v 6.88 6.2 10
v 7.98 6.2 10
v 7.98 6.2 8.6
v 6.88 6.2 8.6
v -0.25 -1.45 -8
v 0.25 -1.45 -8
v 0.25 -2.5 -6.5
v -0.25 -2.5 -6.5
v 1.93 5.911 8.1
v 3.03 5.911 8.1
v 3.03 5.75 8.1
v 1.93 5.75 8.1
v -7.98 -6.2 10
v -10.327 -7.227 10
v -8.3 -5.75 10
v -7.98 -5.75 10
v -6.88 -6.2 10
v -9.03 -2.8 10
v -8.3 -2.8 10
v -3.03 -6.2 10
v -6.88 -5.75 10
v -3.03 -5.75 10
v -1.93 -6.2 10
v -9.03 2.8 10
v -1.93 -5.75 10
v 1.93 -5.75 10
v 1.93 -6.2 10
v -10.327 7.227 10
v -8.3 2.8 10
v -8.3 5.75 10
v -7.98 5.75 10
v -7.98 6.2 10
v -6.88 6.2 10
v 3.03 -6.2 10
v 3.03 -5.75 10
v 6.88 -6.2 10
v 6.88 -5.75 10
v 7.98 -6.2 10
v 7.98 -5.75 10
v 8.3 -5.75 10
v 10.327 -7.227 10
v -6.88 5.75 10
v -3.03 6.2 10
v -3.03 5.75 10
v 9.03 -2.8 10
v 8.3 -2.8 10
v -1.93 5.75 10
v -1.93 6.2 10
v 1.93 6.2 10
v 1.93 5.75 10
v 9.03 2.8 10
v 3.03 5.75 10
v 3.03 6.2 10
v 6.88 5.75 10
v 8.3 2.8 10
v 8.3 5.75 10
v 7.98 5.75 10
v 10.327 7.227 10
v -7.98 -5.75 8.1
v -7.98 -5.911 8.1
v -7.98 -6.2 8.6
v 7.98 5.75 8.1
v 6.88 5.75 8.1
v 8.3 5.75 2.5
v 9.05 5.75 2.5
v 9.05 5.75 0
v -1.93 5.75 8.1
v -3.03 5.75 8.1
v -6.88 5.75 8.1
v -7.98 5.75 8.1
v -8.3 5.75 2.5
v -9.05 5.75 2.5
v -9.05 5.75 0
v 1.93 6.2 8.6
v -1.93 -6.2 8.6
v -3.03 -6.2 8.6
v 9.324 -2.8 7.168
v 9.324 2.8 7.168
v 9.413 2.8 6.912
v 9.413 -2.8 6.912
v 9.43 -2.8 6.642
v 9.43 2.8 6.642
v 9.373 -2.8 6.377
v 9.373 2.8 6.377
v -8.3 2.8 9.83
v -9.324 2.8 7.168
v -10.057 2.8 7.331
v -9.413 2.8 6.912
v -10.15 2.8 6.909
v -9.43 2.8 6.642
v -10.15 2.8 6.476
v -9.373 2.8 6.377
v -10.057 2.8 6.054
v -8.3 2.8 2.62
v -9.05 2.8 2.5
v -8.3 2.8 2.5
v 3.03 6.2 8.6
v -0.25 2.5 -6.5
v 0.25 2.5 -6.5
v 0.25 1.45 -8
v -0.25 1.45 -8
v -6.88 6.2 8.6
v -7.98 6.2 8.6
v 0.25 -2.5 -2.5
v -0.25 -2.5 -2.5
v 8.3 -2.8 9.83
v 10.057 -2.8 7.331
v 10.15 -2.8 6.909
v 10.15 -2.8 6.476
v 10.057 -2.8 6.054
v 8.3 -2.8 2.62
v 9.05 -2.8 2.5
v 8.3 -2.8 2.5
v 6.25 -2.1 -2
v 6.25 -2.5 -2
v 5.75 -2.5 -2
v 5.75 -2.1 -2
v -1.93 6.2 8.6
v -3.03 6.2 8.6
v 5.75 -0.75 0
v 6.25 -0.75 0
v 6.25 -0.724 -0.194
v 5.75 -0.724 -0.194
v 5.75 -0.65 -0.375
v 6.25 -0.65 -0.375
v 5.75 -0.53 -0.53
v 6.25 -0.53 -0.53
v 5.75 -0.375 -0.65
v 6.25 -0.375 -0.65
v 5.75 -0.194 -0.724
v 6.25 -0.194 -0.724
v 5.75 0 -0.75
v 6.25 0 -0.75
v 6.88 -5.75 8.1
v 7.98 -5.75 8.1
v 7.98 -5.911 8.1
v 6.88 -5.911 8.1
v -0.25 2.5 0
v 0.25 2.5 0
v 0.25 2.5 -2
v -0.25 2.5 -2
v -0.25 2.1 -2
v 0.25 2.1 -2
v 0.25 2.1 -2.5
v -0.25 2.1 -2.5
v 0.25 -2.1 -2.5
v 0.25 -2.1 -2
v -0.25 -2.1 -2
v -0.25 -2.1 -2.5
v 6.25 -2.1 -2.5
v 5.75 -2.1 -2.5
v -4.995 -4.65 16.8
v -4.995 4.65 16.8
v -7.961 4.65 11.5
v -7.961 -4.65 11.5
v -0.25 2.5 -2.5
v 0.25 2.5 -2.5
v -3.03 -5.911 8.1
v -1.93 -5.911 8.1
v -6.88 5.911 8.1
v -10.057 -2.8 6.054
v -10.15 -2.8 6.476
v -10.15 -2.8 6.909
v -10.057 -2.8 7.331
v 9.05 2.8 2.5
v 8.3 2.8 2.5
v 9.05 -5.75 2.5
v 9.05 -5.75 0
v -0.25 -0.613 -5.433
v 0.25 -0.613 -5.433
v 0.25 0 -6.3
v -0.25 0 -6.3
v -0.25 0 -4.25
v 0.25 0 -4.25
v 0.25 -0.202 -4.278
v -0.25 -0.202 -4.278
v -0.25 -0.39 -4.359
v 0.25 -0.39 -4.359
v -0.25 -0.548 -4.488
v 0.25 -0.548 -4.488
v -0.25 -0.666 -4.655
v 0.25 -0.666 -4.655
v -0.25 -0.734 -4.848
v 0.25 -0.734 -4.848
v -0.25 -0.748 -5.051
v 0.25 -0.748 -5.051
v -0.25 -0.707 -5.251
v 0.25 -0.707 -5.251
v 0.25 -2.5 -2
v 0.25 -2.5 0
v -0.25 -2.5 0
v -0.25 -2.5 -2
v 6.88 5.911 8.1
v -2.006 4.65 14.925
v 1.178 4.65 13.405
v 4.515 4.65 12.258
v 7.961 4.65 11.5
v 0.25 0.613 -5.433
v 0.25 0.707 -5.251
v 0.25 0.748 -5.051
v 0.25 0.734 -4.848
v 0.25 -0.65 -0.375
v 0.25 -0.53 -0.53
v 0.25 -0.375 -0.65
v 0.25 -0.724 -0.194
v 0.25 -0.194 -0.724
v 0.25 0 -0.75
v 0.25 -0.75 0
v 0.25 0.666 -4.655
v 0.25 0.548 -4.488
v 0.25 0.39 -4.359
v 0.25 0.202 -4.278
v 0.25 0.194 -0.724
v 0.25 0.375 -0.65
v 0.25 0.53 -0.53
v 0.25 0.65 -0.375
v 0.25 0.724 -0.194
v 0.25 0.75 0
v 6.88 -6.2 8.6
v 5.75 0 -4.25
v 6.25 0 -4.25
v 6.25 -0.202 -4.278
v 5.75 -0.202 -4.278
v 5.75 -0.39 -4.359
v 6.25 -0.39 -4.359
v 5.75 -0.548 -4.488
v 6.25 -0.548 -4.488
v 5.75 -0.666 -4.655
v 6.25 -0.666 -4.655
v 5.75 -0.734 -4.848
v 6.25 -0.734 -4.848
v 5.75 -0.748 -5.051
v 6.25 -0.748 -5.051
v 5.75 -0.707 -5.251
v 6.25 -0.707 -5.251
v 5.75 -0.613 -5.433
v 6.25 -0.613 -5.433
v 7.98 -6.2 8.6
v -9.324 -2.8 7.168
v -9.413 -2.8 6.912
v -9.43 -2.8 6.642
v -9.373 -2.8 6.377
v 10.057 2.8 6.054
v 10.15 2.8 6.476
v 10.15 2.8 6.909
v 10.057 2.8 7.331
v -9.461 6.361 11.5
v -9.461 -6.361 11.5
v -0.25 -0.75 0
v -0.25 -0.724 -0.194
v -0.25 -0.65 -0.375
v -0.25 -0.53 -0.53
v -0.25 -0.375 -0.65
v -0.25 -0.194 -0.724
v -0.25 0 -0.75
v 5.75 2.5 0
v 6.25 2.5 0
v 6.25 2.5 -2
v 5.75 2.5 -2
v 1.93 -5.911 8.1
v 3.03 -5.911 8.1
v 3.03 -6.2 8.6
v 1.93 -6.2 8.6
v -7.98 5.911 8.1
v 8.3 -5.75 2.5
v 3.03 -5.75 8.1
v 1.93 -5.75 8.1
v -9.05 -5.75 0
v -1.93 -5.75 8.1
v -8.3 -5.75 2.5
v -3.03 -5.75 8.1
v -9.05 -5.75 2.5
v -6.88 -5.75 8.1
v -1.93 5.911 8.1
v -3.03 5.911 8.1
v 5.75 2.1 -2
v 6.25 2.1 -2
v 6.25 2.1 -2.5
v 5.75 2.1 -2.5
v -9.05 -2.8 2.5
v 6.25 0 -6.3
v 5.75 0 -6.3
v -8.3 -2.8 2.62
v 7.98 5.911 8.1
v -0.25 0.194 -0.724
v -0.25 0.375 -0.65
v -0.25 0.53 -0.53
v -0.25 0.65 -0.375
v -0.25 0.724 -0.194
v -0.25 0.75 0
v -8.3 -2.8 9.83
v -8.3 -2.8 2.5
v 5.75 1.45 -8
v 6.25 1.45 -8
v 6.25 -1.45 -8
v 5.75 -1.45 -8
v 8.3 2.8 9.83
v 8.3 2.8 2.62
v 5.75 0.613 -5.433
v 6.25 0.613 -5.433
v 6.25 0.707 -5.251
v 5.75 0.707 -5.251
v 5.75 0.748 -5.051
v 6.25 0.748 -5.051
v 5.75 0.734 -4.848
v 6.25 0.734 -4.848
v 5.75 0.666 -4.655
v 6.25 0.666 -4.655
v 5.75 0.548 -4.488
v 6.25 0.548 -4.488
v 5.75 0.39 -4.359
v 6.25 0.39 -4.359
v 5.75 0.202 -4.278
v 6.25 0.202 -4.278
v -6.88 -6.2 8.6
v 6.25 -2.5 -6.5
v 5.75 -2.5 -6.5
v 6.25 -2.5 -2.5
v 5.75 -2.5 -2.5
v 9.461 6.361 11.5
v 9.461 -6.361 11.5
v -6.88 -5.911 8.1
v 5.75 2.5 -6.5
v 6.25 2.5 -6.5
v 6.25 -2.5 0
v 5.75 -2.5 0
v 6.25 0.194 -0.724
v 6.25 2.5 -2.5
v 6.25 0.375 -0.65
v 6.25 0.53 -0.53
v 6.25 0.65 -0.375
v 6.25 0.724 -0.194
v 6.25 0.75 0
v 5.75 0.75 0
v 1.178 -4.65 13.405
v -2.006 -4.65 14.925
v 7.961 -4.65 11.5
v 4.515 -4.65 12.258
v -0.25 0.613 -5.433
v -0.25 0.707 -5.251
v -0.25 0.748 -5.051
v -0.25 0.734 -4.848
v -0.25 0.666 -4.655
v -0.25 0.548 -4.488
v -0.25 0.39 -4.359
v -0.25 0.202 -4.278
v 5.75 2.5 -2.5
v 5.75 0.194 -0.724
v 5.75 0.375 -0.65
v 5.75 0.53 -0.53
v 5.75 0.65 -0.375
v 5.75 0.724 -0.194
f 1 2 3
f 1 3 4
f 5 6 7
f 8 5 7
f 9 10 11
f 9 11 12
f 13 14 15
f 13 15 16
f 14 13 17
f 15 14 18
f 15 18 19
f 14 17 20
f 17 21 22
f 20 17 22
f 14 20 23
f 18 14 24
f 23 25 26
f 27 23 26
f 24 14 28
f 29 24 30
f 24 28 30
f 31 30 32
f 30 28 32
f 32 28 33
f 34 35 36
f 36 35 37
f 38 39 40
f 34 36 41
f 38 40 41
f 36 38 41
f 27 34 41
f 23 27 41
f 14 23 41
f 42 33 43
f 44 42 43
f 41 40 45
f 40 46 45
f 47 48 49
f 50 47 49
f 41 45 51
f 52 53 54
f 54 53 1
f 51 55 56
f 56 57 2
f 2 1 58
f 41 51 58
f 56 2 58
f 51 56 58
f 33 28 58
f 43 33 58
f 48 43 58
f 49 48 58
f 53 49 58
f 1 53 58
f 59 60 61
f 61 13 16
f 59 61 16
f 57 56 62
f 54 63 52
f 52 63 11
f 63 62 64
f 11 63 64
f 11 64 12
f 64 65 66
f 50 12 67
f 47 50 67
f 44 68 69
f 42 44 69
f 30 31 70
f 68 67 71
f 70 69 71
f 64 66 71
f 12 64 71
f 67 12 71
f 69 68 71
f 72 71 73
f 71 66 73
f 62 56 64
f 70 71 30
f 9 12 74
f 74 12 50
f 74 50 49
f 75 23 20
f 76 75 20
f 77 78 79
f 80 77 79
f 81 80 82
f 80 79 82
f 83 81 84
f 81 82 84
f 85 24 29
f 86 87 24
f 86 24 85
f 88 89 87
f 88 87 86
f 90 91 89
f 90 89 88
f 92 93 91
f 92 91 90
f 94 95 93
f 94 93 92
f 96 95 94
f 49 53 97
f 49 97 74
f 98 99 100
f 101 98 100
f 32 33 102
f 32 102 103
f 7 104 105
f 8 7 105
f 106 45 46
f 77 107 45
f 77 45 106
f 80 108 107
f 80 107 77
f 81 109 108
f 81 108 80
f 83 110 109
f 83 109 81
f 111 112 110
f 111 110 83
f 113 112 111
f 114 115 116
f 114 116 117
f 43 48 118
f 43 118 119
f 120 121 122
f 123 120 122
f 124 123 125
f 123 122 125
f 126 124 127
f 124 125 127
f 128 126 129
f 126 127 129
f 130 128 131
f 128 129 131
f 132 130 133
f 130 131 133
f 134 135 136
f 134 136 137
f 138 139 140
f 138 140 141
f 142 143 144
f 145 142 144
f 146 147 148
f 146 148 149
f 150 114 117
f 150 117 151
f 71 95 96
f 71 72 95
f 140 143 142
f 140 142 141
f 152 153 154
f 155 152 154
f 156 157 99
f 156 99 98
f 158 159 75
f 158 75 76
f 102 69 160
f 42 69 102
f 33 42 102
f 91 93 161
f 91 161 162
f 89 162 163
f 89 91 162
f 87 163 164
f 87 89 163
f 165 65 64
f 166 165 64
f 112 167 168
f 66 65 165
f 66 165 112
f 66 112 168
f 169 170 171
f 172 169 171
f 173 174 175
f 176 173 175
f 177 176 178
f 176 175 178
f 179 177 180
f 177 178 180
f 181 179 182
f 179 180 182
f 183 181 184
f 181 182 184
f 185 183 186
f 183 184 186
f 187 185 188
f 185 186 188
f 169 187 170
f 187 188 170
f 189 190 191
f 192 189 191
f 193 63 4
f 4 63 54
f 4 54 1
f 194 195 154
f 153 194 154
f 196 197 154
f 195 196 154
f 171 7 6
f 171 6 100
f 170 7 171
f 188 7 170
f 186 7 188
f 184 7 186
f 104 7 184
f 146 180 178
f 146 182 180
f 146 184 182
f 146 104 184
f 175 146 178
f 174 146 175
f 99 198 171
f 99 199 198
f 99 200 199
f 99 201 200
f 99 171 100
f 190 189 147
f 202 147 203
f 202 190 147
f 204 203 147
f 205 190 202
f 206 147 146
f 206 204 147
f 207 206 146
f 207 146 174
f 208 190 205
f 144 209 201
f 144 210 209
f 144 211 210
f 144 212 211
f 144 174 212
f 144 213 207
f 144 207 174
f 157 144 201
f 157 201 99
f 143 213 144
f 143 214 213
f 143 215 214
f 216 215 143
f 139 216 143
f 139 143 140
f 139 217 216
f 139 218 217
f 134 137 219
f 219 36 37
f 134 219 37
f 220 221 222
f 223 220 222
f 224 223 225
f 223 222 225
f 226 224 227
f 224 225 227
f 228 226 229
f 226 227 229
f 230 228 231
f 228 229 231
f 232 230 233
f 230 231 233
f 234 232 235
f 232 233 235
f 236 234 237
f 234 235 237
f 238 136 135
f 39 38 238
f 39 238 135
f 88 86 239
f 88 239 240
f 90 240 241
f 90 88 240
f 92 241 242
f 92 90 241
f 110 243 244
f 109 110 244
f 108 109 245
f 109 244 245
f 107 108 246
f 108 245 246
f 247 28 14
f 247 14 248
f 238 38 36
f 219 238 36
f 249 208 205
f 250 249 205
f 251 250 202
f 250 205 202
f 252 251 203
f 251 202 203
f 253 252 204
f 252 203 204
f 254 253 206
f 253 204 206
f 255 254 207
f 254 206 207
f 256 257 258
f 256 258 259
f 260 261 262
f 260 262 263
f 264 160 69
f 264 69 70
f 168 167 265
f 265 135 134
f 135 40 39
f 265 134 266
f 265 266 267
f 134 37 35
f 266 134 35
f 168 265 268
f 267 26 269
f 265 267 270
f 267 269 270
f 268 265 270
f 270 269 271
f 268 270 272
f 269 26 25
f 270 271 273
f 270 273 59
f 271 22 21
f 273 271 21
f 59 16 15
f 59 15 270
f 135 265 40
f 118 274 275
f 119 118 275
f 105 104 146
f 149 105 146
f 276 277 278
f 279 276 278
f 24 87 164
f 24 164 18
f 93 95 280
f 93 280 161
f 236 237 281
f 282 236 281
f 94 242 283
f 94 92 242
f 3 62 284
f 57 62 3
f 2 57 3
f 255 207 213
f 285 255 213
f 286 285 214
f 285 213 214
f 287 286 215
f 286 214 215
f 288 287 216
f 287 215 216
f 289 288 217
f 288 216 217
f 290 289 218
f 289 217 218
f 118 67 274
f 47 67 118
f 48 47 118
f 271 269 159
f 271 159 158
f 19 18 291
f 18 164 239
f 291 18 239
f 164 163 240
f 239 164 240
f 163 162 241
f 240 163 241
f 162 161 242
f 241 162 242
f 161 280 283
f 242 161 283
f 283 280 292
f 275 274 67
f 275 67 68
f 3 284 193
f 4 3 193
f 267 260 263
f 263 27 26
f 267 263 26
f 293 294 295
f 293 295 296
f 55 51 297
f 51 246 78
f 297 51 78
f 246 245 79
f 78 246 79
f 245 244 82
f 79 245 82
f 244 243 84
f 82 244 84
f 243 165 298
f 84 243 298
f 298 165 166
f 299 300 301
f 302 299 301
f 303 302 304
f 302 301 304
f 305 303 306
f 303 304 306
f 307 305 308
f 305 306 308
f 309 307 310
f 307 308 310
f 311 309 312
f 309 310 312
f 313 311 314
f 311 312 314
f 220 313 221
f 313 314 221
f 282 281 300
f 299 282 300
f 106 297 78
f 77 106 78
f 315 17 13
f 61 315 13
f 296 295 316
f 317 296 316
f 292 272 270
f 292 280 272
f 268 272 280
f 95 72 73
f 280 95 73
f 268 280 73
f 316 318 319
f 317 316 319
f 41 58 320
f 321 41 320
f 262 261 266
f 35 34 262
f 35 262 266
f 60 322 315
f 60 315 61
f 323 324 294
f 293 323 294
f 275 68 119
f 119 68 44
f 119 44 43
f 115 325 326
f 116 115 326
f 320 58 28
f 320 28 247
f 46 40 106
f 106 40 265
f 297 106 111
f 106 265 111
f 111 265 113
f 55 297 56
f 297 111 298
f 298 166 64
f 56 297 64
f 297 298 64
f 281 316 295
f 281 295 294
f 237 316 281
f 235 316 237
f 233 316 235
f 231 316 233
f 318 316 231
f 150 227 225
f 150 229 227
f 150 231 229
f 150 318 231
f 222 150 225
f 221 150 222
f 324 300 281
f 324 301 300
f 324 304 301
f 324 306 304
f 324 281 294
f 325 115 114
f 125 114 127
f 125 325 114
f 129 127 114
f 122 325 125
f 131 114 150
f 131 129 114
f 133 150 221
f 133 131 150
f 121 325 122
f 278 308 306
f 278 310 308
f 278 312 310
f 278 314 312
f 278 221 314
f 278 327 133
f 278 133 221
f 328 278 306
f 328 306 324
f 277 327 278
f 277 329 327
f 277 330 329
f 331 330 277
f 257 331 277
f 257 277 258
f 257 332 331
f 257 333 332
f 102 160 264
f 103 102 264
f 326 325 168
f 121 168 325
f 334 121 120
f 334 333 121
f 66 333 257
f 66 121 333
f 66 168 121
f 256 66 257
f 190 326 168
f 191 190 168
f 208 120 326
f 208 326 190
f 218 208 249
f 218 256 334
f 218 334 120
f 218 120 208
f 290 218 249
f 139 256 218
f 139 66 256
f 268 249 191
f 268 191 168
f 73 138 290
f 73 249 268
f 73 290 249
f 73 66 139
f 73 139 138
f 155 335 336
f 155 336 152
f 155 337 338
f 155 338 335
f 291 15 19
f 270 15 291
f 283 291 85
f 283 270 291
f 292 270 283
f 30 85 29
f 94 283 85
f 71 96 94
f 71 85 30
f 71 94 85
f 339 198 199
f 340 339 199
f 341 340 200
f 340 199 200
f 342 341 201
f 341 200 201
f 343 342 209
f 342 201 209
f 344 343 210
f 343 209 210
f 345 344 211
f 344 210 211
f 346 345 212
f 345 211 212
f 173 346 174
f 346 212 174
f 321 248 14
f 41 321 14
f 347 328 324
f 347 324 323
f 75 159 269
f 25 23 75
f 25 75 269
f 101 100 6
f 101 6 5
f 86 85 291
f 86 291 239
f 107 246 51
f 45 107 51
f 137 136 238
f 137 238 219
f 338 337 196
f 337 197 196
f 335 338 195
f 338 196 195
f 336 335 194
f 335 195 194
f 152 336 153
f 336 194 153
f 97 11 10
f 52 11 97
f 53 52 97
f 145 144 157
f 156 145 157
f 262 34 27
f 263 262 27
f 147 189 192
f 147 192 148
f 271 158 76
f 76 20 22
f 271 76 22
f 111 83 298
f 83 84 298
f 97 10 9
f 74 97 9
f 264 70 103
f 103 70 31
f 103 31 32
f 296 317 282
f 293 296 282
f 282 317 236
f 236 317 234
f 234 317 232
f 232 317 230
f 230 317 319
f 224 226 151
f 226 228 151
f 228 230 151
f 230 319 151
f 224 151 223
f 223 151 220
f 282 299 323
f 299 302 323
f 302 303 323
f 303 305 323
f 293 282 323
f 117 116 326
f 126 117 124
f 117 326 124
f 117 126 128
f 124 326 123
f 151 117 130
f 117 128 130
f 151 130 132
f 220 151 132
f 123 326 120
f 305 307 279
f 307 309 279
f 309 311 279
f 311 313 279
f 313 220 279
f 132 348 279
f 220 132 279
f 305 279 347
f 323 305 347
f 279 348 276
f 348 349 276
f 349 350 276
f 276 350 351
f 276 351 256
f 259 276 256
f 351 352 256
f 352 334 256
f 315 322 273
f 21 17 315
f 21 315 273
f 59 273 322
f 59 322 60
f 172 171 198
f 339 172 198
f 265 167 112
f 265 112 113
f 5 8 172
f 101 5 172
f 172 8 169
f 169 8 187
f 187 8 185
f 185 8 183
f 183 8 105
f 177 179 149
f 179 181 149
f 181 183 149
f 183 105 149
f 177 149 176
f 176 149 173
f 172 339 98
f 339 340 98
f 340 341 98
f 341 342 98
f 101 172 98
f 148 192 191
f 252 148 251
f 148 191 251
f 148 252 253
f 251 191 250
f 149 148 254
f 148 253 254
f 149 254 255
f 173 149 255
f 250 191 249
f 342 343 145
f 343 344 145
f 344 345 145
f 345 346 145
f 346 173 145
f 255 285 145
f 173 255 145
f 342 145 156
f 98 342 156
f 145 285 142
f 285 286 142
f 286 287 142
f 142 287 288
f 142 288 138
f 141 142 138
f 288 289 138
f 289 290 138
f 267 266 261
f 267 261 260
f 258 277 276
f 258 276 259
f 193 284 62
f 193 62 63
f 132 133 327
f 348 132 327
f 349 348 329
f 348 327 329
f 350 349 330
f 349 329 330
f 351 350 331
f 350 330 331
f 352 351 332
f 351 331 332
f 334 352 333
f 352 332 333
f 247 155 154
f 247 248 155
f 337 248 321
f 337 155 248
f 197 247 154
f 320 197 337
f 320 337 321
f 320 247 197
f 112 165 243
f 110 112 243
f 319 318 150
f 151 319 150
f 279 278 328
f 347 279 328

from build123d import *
from OCP.BRepFilletAPI import BRepFilletAPI_MakeChamfer

# Parameters (mm, degrees)
SKETCH1_W                       = 16.6
SKETCH1_H                       = 11.5
BOSS_EXTRUDE1_DEPTH             = 10
SKETCH2_W                       = 21
SKETCH2_H                       = 14.8
BOSS_EXTRUDE2_DEPTH             = 1.5
SKETCH3_W                       = 0.5
SKETCH3_H                       = 5
BOSS_EXTRUDE3_DEPTH             = 8
SKETCH4_W                       = 0.5
SKETCH4_H                       = 0.4
CUT_EXTRUDE1_DEPTH              = 22.623424798
BOSS_EXTRUDE4_REACH             = 19.241
SKETCH5_W                       = 0.75
SKETCH5_H                       = 2.5
BOSS_EXTRUDE4_DIRECTION_2_REACH = 19.241
BOSS_EXTRUDE5_DEPTH             = 2.8
CHAMFER1_SIZE                   = 1.8
CHAMFER1_SIZE_2                 = 1.039230485
BOSS_EXTRUDE6_DEPTH             = 4.65
SKETCH8_W                       = 1.1
SKETCH8_H                       = 0.45
BOSS_EXTRUDE7_DEPTH             = 1.9
CHAMFER2_SIZE                   = 0.5
CHAMFER2_SIZE2                  = 0.288675135


with BuildPart() as part:
    # Sketch1 → Boss-Extrude1 (new body)
    with BuildSketch(Plane.XY):
        Rectangle(SKETCH1_W, SKETCH1_H)
    extrude(amount=BOSS_EXTRUDE1_DEPTH)

    # Sketch2 → Boss-Extrude2 (add)
    with BuildSketch(Plane.XY.offset(10)):
        Rectangle(SKETCH2_W, SKETCH2_H)
    extrude(amount=BOSS_EXTRUDE2_DEPTH)

    # Sketch3 → Boss-Extrude3 (add)
    with BuildSketch(Plane(origin=(0, 0, 0), x_dir=(-1, 0, 0), z_dir=(0, 0, -1))):
        Rectangle(SKETCH3_W, SKETCH3_H)
        with Locations((-6, 0)):
            Rectangle(SKETCH3_W, SKETCH3_H)
    extrude(amount=BOSS_EXTRUDE3_DEPTH)

    # Sketch4 → Cut-Extrude1 (cut, through all)
    with BuildSketch(Plane(origin=(6.25, 0, 0), x_dir=(0, 0, -1), z_dir=(1, 0, 0))):
        Polygon((6.5, 2.5), (8, 1.449688693), (8, 2.5), align=None)
        Polygon((8, -2.5), (8, -1.449688693), (6.5, -2.5), align=None)
        with Locations((2.25, -2.3)):
            Rectangle(SKETCH4_W, SKETCH4_H)
        with BuildLine():
            ThreePointArc((0, -0.75), (0.530330086, -0.530330086), (0.75, 0))
            Line((0.75, 0), (0, 0))
            Line((0, 0), (0, -0.75))
        make_face()
        with BuildLine():
            Line((0, 0), (0.75, 0))
            ThreePointArc((0.75, 0), (0.530330086, 0.530330086), (0, 0.75))
            Line((0, 0.75), (0, 0))
        make_face()
        with Locations((2.25, 2.3)):
            Rectangle(SKETCH4_W, SKETCH4_H)
        with BuildLine():
            Line((4.25, 0), (6.3, 0))
            Line((6.3, 0), (5.432692308, 0.612598863))
            ThreePointArc((5.432692308, 0.612598863), (4.655050171, 0.665965176), (4.25, 0))
        make_face()
        with BuildLine():
            Line((5.432692308, -0.612598863), (6.3, 0))
            Line((6.3, 0), (4.25, 0))
            ThreePointArc((4.25, 0), (4.655050171, -0.665965176), (5.432692308, -0.612598863))
        make_face()
    extrude(amount=-CUT_EXTRUDE1_DEPTH, mode=Mode.SUBTRACT)

    # Boss-Extrude4: up to this face of the body (flat: up to its plane)
    boss_extrude4_end = Plane(part.part.faces().sort_by_distance((0, 5.75, 5))[0])
    # Sketch5 → Boss-Extrude4 (add, up to the picked face)
    with BuildSketch(Plane(origin=(0, 0, 0), x_dir=(1, 0, 0), z_dir=(0, 1, 0)), mode=Mode.PRIVATE) as boss_extrude4_sk1:
        with Locations((-8.675, -1.25)):
            Rectangle(SKETCH5_W, SKETCH5_H)
    boss_extrude4_tool1 = split(extrude(boss_extrude4_sk1.sketch, amount=BOSS_EXTRUDE4_REACH, mode=Mode.PRIVATE), bisect_by=boss_extrude4_end, keep=Keep.BOTH, mode=Mode.PRIVATE)
    boss_extrude4 = boss_extrude4_tool1.solids().sort_by(Axis((-8.675, 0, 1.25), (0, 1, 0)))[0]
    add(boss_extrude4)

    # Boss-Extrude4 direction 2: up to this face of the body (flat: up to its plane)
    boss_extrude4_direction_2_end = Plane(part.part.faces().sort_by_distance((0, -5.75, 5))[0])
    # Sketch5 → Boss-Extrude4 direction 2 (add, up to the picked face)
    with BuildSketch(Plane(origin=(0, 0, 0), x_dir=(1, 0, 0), z_dir=(0, 1, 0)), mode=Mode.PRIVATE) as boss_extrude4_direction_2_sk1:
        with Locations((-8.675, -1.25)):
            Rectangle(SKETCH5_W, SKETCH5_H)
    boss_extrude4_direction_2_tool1 = split(extrude(boss_extrude4_direction_2_sk1.sketch, amount=-BOSS_EXTRUDE4_DIRECTION_2_REACH, mode=Mode.PRIVATE), bisect_by=boss_extrude4_direction_2_end, keep=Keep.BOTH, mode=Mode.PRIVATE)
    boss_extrude4_direction_2 = boss_extrude4_direction_2_tool1.solids().sort_by(Axis((-8.675, 0, 1.25), (0, -1, 0)))[0]
    add(boss_extrude4_direction_2)

    # Mirror1: Boss-Extrude4, Boss-Extrude4 direction 2 across plane
    add(boss_extrude4.mirror(Plane(origin=(0, 0, 0), x_dir=(0, 0, 1), z_dir=(1, 0, 0))))
    add(boss_extrude4_direction_2.mirror(Plane(origin=(0, 0, 0), x_dir=(0, 0, 1), z_dir=(1, 0, 0))))

    # Sketch6 → Boss-Extrude5 (add, symmetric)
    with BuildSketch(Plane(origin=(0, 0, 0), x_dir=(1, 0, 0), z_dir=(0, 1, 0))):
        with BuildLine():
            Line((-8.3, -2.5), (-9.05, -2.5))
            Line((-9.05, -2.5), (-10.056775734, -6.054415838))
            ThreePointArc((-10.056775734, -6.054415838), (-10.16130334, -6.692525863), (-10.056775734, -7.330635888))
            Line((-10.056775734, -7.330635888), (-9.03, -10))
            Line((-9.03, -10), (-8.3, -10))
            Line((-8.3, -10), (-8.3, -9.83))
            Line((-8.3, -9.83), (-9.324133061, -7.167955242))
            ThreePointArc((-9.324133061, -7.167955242), (-9.430562185, -6.777402526), (-9.37345004, -6.376657238))
            Line((-9.37345004, -6.376657238), (-8.3, -2.62))
            Line((-8.3, -2.62), (-8.3, -2.5))
        make_face()
    boss_extrude5 = extrude(amount=BOSS_EXTRUDE5_DEPTH, both=True)

    # Mirror2: Boss-Extrude5 across plane
    add(boss_extrude5.mirror(Plane(origin=(0, 0, 0), x_dir=(0, 0, 1), z_dir=(1, 0, 0))))

    # Chamfer1
    # the kernel refuses this chamfer: 1.8, 1.039230485 mm, written as the material it takes off along each edge
    with BuildSketch(Plane(origin=(-15.156754358, 7.4, 11.5), x_dir=(0, 0.019326765612700948, -0.9998132206222079), z_dir=(1, 0, 0))) as chamfer1_piece_1:
        Polygon((CHAMFER1_SIZE * 0.999813220622, -CHAMFER1_SIZE * 0.0193267656127), (-CHAMFER1_SIZE_2 * 0.0193267656042, -CHAMFER1_SIZE_2 * 0.999813220181), (0, 0), align=None)
    extrude(amount=30.313508717, mode=Mode.SUBTRACT)
    with BuildSketch(Plane(origin=(-10.5, -12.056754358, 11.5), x_dir=(-0.019326765612700473, 0, -0.9998132206222079), z_dir=(0, 1, 0)), Plane(origin=(10.5, 12.056754358, 11.5), x_dir=(0.019326765612700473, 0, -0.9998132206222079), z_dir=(0, -1, 0))) as chamfer1_piece_2:
        Polygon((CHAMFER1_SIZE * 0.999813220622, -CHAMFER1_SIZE * 0.0193267656127), (-CHAMFER1_SIZE_2 * 0.0193267656042, -CHAMFER1_SIZE_2 * 0.999813220181), (0, 0), align=None)
    extrude(amount=24.113508717, mode=Mode.SUBTRACT)
    with BuildSketch(Plane(origin=(15.156754358, -7.4, 11.5), x_dir=(0, 0.9983227437537925, 0.05789386240267112), z_dir=(-1, 0, 0))) as chamfer1_piece_3:
        Polygon((CHAMFER1_SIZE_2 * 0.998322743313, CHAMFER1_SIZE_2 * 0.0578938623771), (-CHAMFER1_SIZE * 0.0578938624027, CHAMFER1_SIZE * 0.998322743754), (0, 0), align=None)
    extrude(amount=30.313508717, mode=Mode.SUBTRACT)

    # Sketch7 → Boss-Extrude6 (add, symmetric)
    with BuildSketch(Plane(origin=(0, 0, 0), x_dir=(1, 0, 0), z_dir=(0, 1, 0))):
        with BuildLine():
            Line((-7.960769515, -11.5), (7.960769515, -11.5))
            ThreePointArc((7.960769515, -11.5), (1.177888648, -13.404715365), (-4.995235012, -16.8))
            Line((-4.995235012, -16.8), (-7.960769515, -11.5))
        make_face()
    extrude(amount=BOSS_EXTRUDE6_DEPTH, both=True)

    # Sketch8 → Boss-Extrude7 (add)
    with BuildSketch(Plane(origin=(0, 0, 10), x_dir=(-1, 0, 0), z_dir=(0, 0, -1))):
        with Locations((-2.48, 5.975)):
            Rectangle(SKETCH8_W, SKETCH8_H)
        with Locations((-2.48, -5.975)):
            Rectangle(SKETCH8_W, SKETCH8_H)
        with Locations((-7.43, 5.975)):
            Rectangle(SKETCH8_W, SKETCH8_H)
        with Locations((-7.43, -5.975)):
            Rectangle(SKETCH8_W, SKETCH8_H)
        with Locations((2.48, -5.975)):
            Rectangle(SKETCH8_W, SKETCH8_H)
        with Locations((7.43, -5.975)):
            Rectangle(SKETCH8_W, SKETCH8_H)
        with Locations((2.48, 5.975)):
            Rectangle(SKETCH8_W, SKETCH8_H)
        with Locations((7.43, 5.975)):
            Rectangle(SKETCH8_W, SKETCH8_H)
    extrude(amount=BOSS_EXTRUDE7_DEPTH)

    # Chamfer2: one chamfer whose edges measure the first distance from different faces: ONE call of the kernel's chamfer builder (chamfer() names one face for all edges)
    chamfer2_edges_1 = [part.edges().sort_by_distance(p)[0] for p in [
        (2.48, 6.2, 8.1),
    ]]
    chamfer2_side_1 = [part.faces().sort_by_distance(p)[0] for p in [
        (2.48, 6.2, 9.05),
    ]]
    chamfer2_edges_2 = [part.edges().sort_by_distance(p)[0] for p in [
        (7.43, 6.2, 8.1),
    ]]
    chamfer2_side_2 = [part.faces().sort_by_distance(p)[0] for p in [
        (7.43, 6.2, 9.05),
    ]]
    chamfer2_edges_3 = [part.edges().sort_by_distance(p)[0] for p in [
        (2.48, -6.2, 8.1),
    ]]
    chamfer2_side_3 = [part.faces().sort_by_distance(p)[0] for p in [
        (2.48, -6.2, 9.05),
    ]]
    chamfer2_edges_4 = [part.edges().sort_by_distance(p)[0] for p in [
        (7.43, -6.2, 8.1),
    ]]
    chamfer2_side_4 = [part.faces().sort_by_distance(p)[0] for p in [
        (7.43, -6.2, 9.05),
    ]]
    chamfer2_edges_5 = [part.edges().sort_by_distance(p)[0] for p in [
        (-2.48, -6.2, 8.1),
    ]]
    chamfer2_side_5 = [part.faces().sort_by_distance(p)[0] for p in [
        (-2.48, -6.2, 9.05),
    ]]
    chamfer2_edges_6 = [part.edges().sort_by_distance(p)[0] for p in [
        (-7.43, -6.2, 8.1),
    ]]
    chamfer2_side_6 = [part.faces().sort_by_distance(p)[0] for p in [
        (-7.43, -6.2, 9.05),
    ]]
    chamfer2_edges_7 = [part.edges().sort_by_distance(p)[0] for p in [
        (-2.48, 6.2, 8.1),
    ]]
    chamfer2_side_7 = [part.faces().sort_by_distance(p)[0] for p in [
        (-2.48, 6.2, 9.05),
    ]]
    chamfer2_edges_8 = [part.edges().sort_by_distance(p)[0] for p in [
        (-7.43, 6.2, 8.1),
    ]]
    chamfer2_side_8 = [part.faces().sort_by_distance(p)[0] for p in [
        (-7.43, 6.2, 9.05),
    ]]
    chamfer2 = BRepFilletAPI_MakeChamfer(part.part.solid().wrapped)
    for e in chamfer2_edges_1:
        chamfer2.Add(CHAMFER2_SIZE, CHAMFER2_SIZE2, e.wrapped, chamfer2_side_1[0].wrapped)  # the first distance lies on this face
    for e in chamfer2_edges_2:
        chamfer2.Add(CHAMFER2_SIZE, CHAMFER2_SIZE2, e.wrapped, chamfer2_side_2[0].wrapped)  # the first distance lies on this face
    for e in chamfer2_edges_3:
        chamfer2.Add(CHAMFER2_SIZE, CHAMFER2_SIZE2, e.wrapped, chamfer2_side_3[0].wrapped)  # the first distance lies on this face
    for e in chamfer2_edges_4:
        chamfer2.Add(CHAMFER2_SIZE, CHAMFER2_SIZE2, e.wrapped, chamfer2_side_4[0].wrapped)  # the first distance lies on this face
    for e in chamfer2_edges_5:
        chamfer2.Add(CHAMFER2_SIZE, CHAMFER2_SIZE2, e.wrapped, chamfer2_side_5[0].wrapped)  # the first distance lies on this face
    for e in chamfer2_edges_6:
        chamfer2.Add(CHAMFER2_SIZE, CHAMFER2_SIZE2, e.wrapped, chamfer2_side_6[0].wrapped)  # the first distance lies on this face
    for e in chamfer2_edges_7:
        chamfer2.Add(CHAMFER2_SIZE, CHAMFER2_SIZE2, e.wrapped, chamfer2_side_7[0].wrapped)  # the first distance lies on this face
    for e in chamfer2_edges_8:
        chamfer2.Add(CHAMFER2_SIZE, CHAMFER2_SIZE2, e.wrapped, chamfer2_side_8[0].wrapped)  # the first distance lies on this face
    add(Compound.cast(chamfer2.Shape()), mode=Mode.REPLACE)


solid = part.part
